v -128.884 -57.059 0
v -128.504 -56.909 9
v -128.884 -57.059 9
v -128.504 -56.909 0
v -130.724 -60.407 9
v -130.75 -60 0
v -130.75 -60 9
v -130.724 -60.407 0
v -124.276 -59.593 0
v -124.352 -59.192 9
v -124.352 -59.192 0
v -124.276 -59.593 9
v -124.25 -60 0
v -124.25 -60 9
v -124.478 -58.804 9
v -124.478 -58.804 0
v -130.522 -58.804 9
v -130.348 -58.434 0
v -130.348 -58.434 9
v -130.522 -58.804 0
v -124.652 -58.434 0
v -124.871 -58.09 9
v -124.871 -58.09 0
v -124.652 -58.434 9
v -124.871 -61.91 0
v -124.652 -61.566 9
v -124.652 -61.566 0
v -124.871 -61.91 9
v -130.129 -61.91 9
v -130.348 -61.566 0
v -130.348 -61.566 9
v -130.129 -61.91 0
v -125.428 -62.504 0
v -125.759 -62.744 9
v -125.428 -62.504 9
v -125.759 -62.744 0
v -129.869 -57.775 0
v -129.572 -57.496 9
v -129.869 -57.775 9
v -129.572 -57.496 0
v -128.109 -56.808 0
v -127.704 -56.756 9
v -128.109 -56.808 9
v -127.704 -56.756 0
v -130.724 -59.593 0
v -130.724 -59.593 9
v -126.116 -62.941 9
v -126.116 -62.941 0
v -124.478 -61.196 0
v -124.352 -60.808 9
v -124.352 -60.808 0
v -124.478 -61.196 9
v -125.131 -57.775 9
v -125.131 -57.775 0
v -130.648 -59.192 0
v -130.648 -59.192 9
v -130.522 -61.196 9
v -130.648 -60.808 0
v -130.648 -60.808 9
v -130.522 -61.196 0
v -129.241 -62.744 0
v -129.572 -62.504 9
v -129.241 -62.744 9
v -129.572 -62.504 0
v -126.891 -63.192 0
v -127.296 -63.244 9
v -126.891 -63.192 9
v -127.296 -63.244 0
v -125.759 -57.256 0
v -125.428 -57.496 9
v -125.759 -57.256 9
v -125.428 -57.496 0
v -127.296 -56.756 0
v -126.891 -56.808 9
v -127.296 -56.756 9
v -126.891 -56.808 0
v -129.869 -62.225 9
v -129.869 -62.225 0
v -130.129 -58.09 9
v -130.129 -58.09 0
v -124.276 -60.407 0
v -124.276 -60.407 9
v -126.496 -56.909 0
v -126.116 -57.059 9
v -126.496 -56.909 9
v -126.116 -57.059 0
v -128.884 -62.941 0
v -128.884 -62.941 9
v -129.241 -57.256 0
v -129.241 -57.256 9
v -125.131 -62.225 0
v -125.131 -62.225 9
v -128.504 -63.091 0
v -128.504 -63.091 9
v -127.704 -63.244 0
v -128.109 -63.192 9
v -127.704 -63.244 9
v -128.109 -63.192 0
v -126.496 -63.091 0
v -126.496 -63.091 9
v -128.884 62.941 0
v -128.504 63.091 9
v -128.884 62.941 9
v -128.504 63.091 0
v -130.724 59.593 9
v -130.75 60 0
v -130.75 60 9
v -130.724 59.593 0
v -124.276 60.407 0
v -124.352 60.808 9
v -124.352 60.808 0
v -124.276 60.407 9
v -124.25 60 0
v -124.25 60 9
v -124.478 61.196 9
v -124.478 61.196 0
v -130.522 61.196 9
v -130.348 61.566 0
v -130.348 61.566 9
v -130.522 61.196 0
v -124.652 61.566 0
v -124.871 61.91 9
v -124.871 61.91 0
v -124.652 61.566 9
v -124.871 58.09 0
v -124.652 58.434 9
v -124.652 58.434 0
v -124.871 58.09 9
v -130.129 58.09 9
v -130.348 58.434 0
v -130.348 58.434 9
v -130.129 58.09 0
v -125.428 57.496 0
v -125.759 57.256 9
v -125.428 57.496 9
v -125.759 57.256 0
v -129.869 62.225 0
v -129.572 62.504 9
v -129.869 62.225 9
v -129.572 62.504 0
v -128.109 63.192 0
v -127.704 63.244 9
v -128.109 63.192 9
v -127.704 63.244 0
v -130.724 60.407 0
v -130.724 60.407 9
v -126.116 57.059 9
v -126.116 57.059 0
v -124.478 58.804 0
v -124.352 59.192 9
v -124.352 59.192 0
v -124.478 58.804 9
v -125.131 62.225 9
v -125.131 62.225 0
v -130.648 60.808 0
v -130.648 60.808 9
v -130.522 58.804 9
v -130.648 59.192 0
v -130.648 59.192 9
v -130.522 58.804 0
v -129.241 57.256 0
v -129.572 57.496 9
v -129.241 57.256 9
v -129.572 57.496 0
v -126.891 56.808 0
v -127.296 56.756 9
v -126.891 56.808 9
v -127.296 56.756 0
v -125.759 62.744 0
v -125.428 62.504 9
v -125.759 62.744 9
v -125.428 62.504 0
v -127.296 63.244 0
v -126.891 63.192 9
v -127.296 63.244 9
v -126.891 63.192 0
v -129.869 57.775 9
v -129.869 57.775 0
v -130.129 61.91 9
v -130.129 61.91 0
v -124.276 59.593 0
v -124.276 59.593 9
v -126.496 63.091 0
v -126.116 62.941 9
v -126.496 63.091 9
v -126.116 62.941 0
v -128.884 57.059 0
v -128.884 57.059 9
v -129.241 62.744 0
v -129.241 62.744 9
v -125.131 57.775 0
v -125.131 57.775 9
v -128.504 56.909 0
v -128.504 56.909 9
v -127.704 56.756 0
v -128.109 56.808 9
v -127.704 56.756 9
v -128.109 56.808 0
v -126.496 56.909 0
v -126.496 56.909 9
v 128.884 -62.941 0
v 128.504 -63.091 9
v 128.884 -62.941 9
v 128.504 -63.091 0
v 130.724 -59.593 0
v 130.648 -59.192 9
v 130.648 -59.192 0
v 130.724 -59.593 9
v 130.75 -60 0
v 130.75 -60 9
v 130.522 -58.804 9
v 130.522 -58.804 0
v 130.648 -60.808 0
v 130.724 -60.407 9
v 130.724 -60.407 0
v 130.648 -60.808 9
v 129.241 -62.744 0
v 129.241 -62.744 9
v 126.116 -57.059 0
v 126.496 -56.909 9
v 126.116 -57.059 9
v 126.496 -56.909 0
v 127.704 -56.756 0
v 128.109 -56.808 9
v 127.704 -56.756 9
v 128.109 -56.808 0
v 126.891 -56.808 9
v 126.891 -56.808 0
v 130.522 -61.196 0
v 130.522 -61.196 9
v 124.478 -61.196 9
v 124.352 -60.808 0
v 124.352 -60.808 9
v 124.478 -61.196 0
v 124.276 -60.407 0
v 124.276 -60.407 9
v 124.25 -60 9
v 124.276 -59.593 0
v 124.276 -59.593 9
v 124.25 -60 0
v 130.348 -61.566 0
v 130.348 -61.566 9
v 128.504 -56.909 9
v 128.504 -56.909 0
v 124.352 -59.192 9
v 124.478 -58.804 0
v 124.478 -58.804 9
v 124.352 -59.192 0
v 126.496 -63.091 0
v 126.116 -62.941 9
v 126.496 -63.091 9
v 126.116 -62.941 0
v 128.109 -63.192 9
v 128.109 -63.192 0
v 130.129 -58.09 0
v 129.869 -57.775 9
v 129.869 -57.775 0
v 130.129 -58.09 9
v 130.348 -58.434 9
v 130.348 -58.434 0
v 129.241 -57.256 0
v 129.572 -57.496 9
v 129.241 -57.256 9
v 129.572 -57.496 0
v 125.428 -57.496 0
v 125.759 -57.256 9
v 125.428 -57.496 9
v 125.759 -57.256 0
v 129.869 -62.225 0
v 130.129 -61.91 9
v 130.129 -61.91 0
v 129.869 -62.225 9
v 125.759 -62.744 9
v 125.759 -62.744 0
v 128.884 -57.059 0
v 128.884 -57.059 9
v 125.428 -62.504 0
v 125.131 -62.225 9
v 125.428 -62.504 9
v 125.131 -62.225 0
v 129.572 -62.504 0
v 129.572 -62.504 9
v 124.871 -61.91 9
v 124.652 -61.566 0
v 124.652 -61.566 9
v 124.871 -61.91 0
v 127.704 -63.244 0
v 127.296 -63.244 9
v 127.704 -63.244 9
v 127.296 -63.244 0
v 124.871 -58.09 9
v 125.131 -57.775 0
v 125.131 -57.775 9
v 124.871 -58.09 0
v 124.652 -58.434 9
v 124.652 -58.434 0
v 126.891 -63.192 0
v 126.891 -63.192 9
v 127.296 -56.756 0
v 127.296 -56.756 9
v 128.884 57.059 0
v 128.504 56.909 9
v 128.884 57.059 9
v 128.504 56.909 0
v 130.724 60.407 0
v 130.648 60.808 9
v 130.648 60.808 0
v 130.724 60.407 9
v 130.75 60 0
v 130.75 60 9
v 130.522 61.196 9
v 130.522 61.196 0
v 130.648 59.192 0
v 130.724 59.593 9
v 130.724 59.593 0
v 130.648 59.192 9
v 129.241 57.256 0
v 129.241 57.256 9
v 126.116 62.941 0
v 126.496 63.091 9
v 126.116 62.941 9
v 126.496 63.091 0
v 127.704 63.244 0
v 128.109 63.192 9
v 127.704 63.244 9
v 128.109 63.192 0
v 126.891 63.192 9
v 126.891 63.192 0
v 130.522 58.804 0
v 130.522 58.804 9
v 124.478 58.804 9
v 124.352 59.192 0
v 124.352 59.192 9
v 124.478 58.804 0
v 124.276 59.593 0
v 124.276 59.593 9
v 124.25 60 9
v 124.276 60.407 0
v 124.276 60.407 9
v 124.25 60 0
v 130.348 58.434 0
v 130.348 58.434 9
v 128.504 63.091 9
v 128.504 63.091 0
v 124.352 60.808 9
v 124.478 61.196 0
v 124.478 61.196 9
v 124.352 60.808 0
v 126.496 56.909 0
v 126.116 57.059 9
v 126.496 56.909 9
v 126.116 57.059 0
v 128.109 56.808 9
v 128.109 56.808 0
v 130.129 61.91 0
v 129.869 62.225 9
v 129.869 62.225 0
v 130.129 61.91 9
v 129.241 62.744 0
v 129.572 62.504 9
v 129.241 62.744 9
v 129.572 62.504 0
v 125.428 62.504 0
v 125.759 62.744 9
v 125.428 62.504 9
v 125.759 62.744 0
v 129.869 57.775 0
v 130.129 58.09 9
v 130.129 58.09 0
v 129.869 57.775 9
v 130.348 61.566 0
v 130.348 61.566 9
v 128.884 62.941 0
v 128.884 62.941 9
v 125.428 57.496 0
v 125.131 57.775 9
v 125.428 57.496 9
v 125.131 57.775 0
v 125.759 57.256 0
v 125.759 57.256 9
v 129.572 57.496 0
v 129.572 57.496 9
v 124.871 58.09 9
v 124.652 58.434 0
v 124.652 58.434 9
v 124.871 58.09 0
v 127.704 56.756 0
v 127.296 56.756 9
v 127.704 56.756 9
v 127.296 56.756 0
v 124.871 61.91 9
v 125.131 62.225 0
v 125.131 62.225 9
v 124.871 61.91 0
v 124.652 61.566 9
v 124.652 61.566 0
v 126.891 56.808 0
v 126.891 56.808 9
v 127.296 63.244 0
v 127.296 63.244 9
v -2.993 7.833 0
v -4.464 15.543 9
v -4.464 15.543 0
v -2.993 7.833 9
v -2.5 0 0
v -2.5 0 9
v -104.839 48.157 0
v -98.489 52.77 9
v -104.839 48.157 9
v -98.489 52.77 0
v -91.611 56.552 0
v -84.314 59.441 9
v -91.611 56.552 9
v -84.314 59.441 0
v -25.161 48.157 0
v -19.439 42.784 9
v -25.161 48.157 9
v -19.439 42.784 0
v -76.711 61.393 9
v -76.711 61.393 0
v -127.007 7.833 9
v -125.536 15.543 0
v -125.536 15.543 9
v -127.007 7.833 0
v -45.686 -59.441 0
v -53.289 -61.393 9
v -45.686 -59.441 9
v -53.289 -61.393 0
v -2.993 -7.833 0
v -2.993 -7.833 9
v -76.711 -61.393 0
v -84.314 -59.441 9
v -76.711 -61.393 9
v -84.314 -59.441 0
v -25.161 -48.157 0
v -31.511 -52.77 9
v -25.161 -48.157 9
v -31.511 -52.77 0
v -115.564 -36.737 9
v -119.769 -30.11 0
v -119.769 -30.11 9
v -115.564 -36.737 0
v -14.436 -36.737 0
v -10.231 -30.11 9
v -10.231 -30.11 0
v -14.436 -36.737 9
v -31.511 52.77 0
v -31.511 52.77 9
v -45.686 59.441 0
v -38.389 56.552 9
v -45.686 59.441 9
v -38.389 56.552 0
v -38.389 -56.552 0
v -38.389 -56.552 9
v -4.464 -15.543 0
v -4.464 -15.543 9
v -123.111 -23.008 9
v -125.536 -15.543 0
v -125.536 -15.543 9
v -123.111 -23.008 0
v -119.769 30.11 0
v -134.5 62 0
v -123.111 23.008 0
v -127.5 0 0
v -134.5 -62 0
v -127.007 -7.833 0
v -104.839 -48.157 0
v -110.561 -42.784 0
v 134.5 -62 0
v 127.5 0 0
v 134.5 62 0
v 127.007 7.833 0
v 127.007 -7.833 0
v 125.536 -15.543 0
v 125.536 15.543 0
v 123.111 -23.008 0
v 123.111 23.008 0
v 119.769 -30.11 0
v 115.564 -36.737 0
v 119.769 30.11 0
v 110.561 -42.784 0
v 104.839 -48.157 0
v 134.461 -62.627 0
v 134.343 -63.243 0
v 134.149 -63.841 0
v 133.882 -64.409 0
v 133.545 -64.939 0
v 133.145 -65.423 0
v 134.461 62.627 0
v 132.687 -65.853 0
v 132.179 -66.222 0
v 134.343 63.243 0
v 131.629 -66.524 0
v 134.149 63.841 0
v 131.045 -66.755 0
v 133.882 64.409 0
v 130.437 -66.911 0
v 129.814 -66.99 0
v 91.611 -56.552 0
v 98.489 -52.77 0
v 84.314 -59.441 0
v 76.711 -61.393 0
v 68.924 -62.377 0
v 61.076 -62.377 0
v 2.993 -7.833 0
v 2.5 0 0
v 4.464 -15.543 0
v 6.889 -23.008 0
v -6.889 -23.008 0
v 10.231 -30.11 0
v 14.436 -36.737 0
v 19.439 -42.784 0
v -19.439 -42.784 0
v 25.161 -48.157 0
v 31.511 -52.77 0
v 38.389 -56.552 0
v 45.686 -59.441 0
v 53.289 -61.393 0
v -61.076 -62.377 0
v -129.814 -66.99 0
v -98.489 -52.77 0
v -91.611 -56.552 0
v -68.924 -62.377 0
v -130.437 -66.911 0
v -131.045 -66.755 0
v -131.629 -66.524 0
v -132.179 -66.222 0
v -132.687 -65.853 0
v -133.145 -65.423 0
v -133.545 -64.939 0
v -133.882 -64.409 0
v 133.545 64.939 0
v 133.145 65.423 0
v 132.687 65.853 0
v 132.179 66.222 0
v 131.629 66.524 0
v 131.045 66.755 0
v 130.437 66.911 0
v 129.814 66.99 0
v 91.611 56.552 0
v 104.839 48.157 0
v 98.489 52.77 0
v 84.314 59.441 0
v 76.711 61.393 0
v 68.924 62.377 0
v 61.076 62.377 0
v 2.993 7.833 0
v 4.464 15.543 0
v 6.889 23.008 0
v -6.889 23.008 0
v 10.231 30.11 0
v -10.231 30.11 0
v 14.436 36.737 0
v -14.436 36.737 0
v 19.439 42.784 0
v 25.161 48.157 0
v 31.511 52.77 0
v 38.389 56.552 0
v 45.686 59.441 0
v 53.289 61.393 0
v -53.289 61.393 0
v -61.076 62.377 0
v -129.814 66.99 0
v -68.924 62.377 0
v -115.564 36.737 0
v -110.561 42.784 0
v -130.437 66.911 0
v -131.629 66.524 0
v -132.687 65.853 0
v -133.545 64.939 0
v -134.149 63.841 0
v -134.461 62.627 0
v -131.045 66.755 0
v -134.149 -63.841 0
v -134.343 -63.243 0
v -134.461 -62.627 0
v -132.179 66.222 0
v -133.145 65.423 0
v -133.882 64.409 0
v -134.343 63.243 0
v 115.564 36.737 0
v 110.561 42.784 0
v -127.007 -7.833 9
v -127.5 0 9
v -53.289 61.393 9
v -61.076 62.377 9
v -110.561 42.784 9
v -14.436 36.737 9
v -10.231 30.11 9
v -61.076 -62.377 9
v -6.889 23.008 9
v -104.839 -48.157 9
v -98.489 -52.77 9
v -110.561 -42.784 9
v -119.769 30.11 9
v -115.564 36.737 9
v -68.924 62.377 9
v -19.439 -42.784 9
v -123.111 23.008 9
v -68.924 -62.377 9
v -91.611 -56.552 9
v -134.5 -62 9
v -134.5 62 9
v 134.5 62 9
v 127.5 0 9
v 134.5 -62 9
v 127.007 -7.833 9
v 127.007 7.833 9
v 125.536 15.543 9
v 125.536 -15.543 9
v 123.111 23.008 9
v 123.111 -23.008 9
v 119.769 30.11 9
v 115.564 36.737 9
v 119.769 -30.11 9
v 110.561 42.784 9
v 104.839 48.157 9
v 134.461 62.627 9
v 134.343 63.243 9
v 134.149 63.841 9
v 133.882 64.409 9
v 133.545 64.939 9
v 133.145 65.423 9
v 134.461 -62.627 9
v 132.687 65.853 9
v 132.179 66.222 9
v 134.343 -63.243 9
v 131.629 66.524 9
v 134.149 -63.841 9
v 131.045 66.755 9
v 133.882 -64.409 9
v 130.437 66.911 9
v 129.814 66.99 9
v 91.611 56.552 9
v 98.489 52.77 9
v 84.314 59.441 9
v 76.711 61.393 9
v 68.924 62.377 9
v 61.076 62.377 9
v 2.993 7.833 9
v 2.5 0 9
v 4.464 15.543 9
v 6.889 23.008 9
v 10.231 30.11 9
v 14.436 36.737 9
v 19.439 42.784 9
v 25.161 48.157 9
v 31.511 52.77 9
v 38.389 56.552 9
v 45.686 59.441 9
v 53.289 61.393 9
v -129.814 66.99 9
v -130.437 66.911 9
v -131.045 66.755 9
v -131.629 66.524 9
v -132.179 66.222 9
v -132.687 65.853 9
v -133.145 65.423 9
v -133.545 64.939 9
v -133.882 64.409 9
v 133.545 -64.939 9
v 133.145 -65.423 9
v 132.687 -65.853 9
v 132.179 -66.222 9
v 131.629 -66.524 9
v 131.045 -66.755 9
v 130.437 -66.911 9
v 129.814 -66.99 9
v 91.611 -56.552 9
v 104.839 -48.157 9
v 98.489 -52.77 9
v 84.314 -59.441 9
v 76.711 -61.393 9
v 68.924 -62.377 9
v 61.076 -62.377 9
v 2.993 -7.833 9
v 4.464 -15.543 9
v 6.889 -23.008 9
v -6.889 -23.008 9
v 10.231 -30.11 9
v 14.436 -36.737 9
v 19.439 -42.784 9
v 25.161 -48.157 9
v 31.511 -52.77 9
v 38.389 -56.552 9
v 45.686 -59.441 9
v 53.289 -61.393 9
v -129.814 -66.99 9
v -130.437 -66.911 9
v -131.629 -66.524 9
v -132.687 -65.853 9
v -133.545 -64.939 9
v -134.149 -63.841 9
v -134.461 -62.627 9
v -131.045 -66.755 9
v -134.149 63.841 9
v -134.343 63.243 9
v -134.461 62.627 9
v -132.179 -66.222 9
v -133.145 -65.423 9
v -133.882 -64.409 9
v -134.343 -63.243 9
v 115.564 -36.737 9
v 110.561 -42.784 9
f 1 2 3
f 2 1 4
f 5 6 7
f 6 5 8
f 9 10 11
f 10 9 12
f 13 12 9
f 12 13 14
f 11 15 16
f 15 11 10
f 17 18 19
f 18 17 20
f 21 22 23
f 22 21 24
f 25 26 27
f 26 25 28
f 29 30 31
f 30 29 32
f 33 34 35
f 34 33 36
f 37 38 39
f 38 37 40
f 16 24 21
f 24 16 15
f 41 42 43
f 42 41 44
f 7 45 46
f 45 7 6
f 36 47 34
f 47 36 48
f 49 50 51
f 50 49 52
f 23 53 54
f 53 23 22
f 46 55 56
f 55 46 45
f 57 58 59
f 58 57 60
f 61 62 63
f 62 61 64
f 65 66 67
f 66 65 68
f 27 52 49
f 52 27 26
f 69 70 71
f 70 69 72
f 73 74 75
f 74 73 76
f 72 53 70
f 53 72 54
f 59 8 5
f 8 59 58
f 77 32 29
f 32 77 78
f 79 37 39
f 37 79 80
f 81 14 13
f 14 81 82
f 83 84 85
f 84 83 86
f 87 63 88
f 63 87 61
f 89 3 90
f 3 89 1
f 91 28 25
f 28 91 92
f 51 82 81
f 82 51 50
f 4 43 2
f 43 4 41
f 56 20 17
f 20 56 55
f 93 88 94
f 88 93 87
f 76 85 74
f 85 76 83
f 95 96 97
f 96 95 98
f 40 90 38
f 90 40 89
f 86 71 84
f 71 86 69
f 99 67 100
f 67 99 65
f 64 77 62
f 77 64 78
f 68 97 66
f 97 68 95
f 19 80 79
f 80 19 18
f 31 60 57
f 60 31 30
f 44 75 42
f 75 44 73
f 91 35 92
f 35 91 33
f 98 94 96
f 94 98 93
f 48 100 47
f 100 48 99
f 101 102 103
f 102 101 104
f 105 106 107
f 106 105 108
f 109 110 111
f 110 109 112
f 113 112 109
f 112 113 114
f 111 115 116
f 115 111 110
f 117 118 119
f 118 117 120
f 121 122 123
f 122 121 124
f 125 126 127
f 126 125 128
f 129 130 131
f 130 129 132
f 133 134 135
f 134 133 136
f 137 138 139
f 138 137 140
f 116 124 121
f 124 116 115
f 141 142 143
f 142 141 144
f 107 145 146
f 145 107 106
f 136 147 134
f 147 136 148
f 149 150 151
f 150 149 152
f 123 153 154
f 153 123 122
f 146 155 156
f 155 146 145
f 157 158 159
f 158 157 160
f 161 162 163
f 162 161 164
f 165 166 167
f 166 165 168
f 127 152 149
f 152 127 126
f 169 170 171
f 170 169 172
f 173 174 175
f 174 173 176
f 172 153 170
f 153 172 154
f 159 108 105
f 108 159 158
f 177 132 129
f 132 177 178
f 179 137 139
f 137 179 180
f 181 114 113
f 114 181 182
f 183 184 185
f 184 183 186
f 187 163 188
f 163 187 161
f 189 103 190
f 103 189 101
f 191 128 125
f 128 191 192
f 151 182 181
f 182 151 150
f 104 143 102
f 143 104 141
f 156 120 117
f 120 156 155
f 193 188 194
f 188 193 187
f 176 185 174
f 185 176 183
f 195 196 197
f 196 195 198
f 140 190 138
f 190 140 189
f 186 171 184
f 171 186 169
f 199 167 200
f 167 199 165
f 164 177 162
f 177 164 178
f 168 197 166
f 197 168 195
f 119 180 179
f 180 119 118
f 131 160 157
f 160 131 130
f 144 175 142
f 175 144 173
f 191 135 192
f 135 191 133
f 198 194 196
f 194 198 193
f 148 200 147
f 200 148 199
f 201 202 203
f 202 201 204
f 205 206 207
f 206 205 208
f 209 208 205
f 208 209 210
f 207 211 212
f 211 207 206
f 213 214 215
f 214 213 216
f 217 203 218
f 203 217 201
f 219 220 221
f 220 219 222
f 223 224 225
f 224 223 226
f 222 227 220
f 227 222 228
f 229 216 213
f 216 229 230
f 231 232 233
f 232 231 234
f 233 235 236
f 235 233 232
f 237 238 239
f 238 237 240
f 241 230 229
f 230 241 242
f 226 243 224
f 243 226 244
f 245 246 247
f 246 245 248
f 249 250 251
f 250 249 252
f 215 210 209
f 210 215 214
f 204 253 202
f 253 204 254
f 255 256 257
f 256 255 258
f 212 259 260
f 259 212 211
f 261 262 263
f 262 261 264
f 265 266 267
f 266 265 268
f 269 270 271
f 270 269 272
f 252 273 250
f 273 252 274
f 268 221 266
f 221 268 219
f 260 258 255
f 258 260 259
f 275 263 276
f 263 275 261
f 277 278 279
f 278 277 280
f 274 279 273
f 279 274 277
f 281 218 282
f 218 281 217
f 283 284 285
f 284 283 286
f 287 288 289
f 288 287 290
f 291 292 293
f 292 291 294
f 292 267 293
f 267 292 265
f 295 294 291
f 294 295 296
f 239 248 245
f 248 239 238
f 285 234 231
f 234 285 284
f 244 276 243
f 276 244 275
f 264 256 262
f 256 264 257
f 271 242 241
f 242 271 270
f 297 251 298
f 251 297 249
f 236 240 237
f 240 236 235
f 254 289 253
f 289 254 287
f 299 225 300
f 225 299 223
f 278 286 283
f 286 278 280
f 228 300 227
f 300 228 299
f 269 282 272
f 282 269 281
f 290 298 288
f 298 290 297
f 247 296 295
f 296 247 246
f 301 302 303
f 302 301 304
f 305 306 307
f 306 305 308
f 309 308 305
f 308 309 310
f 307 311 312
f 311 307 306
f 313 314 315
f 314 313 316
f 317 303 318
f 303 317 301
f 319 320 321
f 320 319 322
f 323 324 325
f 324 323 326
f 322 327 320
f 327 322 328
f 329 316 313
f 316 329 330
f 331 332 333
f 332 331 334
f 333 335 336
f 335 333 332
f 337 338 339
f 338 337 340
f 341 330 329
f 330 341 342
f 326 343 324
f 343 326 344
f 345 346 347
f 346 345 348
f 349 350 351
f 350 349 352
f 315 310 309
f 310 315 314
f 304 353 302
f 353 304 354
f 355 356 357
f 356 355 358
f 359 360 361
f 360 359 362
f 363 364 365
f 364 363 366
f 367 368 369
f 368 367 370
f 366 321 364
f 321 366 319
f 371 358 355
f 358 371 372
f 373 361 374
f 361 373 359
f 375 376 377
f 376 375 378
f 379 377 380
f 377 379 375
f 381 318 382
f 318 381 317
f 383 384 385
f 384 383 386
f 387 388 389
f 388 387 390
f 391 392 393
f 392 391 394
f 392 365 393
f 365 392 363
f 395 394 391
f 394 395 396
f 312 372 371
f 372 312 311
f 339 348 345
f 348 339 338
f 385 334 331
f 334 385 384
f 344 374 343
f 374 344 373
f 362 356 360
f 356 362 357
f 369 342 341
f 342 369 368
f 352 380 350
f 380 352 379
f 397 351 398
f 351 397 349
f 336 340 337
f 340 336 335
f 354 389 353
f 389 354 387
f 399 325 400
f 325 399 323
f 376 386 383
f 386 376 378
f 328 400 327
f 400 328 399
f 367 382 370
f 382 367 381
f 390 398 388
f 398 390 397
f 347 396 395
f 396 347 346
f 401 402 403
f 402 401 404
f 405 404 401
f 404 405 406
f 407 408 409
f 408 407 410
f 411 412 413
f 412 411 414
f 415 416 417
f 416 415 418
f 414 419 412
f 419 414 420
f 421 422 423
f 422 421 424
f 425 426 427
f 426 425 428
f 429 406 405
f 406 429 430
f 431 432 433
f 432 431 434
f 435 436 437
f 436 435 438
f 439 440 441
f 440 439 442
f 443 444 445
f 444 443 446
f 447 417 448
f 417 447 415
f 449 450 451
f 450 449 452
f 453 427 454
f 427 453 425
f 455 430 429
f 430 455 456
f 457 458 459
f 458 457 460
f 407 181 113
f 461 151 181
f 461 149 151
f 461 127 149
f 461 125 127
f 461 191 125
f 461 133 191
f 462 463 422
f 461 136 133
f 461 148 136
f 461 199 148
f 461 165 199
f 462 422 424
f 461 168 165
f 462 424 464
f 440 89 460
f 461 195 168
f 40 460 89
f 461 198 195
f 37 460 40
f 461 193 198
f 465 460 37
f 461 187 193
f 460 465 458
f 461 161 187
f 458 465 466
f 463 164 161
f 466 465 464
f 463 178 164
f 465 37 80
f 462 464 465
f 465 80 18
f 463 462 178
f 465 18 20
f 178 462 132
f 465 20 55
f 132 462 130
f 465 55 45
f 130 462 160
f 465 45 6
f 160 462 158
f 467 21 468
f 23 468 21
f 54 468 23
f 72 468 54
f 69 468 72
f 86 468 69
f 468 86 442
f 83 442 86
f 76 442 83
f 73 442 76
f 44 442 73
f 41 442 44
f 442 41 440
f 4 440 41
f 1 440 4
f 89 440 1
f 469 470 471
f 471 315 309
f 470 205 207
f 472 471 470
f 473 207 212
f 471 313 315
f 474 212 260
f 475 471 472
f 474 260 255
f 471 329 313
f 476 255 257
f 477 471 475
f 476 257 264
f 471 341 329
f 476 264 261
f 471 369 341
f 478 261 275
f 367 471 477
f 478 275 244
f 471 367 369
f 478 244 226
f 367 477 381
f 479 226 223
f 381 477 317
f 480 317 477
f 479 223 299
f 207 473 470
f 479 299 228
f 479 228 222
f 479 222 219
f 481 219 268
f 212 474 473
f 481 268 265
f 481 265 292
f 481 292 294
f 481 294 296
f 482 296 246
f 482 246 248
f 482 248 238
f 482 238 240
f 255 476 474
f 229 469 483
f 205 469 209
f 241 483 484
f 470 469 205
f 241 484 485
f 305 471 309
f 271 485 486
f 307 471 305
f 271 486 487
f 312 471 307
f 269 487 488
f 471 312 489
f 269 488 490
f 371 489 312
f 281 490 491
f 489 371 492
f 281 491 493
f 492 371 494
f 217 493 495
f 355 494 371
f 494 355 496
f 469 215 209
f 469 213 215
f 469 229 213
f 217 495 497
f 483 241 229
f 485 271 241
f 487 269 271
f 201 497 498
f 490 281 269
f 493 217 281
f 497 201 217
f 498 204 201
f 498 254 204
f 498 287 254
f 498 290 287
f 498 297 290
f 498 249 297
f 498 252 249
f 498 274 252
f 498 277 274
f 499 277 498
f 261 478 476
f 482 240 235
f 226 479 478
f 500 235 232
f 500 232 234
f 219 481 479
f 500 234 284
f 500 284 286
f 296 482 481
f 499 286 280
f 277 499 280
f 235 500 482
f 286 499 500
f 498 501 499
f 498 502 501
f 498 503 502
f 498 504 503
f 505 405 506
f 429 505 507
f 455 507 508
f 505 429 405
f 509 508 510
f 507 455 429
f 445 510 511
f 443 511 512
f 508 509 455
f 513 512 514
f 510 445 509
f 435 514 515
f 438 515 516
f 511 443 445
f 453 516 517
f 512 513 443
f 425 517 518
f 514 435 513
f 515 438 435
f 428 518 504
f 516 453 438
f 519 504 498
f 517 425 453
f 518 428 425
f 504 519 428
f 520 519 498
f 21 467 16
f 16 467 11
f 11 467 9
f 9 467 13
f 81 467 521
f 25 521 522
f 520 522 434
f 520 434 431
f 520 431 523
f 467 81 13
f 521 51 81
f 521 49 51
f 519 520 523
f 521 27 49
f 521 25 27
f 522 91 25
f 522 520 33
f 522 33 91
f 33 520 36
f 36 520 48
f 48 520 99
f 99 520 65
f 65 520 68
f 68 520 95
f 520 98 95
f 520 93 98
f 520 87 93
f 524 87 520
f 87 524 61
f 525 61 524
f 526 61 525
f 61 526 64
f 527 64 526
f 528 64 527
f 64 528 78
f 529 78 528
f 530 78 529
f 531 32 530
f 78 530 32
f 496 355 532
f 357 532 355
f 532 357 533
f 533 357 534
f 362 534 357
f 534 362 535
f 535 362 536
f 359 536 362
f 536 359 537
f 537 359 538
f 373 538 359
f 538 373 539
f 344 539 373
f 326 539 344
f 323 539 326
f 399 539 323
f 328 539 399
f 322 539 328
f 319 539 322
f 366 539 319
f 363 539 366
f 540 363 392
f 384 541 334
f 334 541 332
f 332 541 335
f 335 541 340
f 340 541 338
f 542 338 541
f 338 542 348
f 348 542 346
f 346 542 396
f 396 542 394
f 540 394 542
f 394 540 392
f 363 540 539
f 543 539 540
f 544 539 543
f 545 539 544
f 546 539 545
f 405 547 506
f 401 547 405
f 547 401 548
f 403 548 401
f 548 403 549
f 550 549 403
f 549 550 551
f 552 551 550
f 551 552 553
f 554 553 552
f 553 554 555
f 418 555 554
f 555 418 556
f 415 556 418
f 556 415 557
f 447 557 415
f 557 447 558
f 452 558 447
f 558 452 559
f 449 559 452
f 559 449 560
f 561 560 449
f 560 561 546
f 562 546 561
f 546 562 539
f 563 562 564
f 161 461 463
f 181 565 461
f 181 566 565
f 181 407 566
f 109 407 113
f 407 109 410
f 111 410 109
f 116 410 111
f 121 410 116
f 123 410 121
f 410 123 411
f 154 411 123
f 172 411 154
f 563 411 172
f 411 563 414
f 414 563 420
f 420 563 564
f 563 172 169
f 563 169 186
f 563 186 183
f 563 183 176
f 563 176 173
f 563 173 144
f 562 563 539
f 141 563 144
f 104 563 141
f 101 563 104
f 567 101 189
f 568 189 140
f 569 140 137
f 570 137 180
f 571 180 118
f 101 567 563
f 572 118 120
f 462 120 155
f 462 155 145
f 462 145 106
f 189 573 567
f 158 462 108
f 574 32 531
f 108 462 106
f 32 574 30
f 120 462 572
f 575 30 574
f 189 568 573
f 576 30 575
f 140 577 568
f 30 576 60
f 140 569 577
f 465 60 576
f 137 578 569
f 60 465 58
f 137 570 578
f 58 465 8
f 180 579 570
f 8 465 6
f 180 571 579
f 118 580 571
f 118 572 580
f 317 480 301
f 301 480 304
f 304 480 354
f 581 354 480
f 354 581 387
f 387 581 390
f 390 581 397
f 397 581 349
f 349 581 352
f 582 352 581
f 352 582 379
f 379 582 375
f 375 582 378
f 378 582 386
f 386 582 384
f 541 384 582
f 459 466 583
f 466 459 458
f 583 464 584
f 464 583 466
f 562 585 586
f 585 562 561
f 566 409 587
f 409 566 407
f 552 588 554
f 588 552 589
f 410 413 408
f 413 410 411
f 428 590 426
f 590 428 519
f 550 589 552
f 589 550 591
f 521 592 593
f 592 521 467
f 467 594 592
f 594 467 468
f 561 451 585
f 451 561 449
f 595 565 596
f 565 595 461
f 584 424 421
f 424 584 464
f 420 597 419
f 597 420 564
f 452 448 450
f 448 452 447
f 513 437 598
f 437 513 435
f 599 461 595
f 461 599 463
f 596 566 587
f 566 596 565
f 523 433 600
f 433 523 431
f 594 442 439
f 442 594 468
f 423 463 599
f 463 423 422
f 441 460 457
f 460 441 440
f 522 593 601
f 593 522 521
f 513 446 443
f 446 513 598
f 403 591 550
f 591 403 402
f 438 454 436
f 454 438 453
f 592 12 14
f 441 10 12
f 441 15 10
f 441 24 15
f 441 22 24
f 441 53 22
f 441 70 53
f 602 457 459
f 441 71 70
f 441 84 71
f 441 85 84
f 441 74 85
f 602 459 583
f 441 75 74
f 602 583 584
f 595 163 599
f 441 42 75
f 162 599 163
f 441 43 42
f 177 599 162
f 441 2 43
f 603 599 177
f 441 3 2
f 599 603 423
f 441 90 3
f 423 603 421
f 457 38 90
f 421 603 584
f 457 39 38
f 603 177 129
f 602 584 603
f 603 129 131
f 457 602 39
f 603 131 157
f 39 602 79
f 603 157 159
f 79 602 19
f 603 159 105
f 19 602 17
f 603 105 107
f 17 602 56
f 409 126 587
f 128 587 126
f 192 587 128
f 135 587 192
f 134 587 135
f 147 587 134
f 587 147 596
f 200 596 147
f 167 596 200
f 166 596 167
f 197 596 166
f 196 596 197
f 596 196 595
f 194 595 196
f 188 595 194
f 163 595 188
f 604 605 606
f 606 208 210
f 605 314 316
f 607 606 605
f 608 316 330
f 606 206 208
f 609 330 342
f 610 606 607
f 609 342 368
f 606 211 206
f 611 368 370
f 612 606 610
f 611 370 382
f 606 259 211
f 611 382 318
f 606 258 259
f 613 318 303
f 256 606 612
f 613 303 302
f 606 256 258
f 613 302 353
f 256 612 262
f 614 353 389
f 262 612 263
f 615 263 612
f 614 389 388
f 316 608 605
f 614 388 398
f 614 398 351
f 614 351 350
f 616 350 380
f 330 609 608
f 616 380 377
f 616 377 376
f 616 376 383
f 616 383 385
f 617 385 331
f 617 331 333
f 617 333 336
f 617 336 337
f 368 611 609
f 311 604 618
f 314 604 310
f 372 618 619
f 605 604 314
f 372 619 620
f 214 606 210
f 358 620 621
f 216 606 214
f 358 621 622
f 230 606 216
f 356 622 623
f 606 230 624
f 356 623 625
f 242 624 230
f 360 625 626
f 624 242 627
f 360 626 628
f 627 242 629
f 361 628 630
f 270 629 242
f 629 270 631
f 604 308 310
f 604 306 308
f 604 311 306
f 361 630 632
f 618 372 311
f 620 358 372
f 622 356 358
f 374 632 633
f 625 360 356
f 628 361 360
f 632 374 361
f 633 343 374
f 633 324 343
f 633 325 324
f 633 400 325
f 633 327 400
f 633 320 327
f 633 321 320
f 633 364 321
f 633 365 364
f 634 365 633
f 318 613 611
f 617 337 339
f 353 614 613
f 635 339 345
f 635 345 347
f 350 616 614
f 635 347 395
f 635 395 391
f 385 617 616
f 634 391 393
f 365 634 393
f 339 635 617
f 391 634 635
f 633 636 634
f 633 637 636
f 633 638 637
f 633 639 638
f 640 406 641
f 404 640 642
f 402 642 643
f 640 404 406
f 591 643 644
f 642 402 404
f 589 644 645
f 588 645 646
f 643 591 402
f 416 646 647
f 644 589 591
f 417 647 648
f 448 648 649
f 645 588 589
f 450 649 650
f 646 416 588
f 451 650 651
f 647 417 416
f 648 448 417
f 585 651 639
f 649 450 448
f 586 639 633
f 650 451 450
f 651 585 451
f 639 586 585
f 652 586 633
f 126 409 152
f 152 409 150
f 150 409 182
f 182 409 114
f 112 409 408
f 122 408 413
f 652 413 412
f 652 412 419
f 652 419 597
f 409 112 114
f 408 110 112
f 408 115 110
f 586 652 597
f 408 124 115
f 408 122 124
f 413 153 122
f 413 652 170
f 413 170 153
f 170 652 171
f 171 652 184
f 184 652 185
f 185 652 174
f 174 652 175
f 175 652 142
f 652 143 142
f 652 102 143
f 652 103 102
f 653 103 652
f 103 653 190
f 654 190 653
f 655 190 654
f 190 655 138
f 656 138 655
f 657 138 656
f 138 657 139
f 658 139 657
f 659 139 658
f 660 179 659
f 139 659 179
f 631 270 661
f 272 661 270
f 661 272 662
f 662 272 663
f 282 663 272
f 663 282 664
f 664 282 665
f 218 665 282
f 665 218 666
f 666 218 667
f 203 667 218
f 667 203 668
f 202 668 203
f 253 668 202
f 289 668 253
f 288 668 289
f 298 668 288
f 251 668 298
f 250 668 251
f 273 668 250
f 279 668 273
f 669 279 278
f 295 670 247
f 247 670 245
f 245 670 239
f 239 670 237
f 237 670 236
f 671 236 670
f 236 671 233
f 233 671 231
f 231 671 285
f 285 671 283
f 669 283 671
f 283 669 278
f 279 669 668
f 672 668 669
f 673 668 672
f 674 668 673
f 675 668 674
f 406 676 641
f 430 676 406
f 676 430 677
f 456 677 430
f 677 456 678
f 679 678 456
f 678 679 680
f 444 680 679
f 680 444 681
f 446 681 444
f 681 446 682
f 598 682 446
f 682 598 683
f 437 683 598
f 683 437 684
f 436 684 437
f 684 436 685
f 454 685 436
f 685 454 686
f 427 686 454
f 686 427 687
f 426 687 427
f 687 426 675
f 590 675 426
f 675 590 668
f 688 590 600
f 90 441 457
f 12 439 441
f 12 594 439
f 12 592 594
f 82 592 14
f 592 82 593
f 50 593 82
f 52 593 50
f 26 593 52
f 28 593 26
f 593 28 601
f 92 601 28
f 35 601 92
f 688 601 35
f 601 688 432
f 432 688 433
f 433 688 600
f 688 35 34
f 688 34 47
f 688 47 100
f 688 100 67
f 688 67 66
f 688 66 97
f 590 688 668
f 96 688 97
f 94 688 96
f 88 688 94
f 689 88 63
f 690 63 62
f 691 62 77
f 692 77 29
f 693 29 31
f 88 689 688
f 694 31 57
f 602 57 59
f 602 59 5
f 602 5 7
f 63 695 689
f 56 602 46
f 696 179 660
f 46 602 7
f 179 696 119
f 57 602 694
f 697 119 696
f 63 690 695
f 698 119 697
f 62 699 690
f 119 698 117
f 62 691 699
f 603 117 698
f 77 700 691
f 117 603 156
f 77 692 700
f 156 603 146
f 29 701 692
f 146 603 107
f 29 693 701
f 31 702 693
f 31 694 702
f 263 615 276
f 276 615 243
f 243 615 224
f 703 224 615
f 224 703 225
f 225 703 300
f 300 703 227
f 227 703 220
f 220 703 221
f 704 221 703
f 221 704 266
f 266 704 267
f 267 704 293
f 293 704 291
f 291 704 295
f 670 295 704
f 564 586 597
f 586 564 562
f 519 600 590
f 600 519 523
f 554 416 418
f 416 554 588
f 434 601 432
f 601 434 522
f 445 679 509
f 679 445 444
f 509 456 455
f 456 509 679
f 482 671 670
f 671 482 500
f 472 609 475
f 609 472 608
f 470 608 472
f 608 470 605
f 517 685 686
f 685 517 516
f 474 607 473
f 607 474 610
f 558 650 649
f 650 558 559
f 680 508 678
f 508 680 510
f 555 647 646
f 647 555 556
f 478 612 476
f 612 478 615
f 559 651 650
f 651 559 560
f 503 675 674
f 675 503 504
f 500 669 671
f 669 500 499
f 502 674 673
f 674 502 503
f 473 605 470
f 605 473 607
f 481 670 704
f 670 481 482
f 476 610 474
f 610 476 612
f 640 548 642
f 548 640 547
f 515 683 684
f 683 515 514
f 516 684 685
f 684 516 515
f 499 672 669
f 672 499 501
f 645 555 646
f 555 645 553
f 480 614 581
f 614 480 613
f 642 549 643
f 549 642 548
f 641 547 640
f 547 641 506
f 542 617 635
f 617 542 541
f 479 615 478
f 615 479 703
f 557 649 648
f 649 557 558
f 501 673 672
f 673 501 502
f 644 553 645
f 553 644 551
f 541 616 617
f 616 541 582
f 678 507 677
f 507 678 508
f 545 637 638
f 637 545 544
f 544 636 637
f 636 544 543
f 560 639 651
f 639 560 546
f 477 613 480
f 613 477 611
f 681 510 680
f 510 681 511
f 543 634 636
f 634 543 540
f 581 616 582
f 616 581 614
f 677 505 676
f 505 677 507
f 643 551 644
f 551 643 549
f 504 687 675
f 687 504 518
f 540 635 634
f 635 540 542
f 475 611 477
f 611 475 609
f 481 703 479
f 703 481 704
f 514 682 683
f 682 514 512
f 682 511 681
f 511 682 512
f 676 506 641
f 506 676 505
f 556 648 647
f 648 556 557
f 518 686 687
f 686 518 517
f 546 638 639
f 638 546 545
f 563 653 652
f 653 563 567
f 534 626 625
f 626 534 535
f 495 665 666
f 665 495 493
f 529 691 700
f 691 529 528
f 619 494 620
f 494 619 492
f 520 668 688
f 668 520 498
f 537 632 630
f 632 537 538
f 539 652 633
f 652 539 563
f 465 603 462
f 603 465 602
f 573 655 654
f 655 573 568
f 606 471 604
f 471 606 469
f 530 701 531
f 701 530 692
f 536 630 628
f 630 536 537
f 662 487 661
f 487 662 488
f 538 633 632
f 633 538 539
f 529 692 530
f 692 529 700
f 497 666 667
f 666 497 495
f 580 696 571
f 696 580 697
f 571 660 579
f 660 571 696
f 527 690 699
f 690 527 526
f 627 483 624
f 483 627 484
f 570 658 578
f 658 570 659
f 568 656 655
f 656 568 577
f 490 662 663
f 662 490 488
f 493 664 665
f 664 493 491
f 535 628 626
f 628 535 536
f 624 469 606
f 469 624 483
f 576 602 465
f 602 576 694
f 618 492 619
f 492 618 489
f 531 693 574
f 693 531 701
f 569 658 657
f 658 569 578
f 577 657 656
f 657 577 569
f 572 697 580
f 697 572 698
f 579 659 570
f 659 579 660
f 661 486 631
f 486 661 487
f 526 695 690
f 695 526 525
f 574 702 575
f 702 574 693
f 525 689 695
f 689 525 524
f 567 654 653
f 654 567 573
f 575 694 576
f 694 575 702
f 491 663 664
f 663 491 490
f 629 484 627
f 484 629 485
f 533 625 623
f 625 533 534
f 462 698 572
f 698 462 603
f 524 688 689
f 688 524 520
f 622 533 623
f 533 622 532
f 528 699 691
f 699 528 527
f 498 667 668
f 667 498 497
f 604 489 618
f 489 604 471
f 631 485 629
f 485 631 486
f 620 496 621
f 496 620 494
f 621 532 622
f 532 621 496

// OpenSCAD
$fn = 50;


difference() {
	union() {
		hull() {
			translate(v = [-129.5000000000, 62.0000000000, 0]) {
				cylinder(h = 9, r = 5);
			}
			translate(v = [129.5000000000, 62.0000000000, 0]) {
				cylinder(h = 9, r = 5);
			}
			translate(v = [-129.5000000000, -62.0000000000, 0]) {
				cylinder(h = 9, r = 5);
			}
			translate(v = [129.5000000000, -62.0000000000, 0]) {
				cylinder(h = 9, r = 5);
			}
		}
	}
	union() {
		#translate(v = [-127.5000000000, -60.0000000000, -100.0000000000]) {
			cylinder(h = 200, r = 3.2500000000);
		}
		#translate(v = [-127.5000000000, 60.0000000000, -100.0000000000]) {
			cylinder(h = 200, r = 3.2500000000);
		}
		#translate(v = [127.5000000000, -60.0000000000, -100.0000000000]) {
			cylinder(h = 200, r = 3.2500000000);
		}
		#translate(v = [127.5000000000, 60.0000000000, -100.0000000000]) {
			cylinder(h = 200, r = 3.2500000000);
		}
		#translate(v = [-65.0000000000, 0, 0]) {
			cylinder(h = 9, r = 62.5000000000);
		}
		#translate(v = [65.0000000000, 0, 0]) {
			cylinder(h = 9, r = 62.5000000000);
		}
	}
}
